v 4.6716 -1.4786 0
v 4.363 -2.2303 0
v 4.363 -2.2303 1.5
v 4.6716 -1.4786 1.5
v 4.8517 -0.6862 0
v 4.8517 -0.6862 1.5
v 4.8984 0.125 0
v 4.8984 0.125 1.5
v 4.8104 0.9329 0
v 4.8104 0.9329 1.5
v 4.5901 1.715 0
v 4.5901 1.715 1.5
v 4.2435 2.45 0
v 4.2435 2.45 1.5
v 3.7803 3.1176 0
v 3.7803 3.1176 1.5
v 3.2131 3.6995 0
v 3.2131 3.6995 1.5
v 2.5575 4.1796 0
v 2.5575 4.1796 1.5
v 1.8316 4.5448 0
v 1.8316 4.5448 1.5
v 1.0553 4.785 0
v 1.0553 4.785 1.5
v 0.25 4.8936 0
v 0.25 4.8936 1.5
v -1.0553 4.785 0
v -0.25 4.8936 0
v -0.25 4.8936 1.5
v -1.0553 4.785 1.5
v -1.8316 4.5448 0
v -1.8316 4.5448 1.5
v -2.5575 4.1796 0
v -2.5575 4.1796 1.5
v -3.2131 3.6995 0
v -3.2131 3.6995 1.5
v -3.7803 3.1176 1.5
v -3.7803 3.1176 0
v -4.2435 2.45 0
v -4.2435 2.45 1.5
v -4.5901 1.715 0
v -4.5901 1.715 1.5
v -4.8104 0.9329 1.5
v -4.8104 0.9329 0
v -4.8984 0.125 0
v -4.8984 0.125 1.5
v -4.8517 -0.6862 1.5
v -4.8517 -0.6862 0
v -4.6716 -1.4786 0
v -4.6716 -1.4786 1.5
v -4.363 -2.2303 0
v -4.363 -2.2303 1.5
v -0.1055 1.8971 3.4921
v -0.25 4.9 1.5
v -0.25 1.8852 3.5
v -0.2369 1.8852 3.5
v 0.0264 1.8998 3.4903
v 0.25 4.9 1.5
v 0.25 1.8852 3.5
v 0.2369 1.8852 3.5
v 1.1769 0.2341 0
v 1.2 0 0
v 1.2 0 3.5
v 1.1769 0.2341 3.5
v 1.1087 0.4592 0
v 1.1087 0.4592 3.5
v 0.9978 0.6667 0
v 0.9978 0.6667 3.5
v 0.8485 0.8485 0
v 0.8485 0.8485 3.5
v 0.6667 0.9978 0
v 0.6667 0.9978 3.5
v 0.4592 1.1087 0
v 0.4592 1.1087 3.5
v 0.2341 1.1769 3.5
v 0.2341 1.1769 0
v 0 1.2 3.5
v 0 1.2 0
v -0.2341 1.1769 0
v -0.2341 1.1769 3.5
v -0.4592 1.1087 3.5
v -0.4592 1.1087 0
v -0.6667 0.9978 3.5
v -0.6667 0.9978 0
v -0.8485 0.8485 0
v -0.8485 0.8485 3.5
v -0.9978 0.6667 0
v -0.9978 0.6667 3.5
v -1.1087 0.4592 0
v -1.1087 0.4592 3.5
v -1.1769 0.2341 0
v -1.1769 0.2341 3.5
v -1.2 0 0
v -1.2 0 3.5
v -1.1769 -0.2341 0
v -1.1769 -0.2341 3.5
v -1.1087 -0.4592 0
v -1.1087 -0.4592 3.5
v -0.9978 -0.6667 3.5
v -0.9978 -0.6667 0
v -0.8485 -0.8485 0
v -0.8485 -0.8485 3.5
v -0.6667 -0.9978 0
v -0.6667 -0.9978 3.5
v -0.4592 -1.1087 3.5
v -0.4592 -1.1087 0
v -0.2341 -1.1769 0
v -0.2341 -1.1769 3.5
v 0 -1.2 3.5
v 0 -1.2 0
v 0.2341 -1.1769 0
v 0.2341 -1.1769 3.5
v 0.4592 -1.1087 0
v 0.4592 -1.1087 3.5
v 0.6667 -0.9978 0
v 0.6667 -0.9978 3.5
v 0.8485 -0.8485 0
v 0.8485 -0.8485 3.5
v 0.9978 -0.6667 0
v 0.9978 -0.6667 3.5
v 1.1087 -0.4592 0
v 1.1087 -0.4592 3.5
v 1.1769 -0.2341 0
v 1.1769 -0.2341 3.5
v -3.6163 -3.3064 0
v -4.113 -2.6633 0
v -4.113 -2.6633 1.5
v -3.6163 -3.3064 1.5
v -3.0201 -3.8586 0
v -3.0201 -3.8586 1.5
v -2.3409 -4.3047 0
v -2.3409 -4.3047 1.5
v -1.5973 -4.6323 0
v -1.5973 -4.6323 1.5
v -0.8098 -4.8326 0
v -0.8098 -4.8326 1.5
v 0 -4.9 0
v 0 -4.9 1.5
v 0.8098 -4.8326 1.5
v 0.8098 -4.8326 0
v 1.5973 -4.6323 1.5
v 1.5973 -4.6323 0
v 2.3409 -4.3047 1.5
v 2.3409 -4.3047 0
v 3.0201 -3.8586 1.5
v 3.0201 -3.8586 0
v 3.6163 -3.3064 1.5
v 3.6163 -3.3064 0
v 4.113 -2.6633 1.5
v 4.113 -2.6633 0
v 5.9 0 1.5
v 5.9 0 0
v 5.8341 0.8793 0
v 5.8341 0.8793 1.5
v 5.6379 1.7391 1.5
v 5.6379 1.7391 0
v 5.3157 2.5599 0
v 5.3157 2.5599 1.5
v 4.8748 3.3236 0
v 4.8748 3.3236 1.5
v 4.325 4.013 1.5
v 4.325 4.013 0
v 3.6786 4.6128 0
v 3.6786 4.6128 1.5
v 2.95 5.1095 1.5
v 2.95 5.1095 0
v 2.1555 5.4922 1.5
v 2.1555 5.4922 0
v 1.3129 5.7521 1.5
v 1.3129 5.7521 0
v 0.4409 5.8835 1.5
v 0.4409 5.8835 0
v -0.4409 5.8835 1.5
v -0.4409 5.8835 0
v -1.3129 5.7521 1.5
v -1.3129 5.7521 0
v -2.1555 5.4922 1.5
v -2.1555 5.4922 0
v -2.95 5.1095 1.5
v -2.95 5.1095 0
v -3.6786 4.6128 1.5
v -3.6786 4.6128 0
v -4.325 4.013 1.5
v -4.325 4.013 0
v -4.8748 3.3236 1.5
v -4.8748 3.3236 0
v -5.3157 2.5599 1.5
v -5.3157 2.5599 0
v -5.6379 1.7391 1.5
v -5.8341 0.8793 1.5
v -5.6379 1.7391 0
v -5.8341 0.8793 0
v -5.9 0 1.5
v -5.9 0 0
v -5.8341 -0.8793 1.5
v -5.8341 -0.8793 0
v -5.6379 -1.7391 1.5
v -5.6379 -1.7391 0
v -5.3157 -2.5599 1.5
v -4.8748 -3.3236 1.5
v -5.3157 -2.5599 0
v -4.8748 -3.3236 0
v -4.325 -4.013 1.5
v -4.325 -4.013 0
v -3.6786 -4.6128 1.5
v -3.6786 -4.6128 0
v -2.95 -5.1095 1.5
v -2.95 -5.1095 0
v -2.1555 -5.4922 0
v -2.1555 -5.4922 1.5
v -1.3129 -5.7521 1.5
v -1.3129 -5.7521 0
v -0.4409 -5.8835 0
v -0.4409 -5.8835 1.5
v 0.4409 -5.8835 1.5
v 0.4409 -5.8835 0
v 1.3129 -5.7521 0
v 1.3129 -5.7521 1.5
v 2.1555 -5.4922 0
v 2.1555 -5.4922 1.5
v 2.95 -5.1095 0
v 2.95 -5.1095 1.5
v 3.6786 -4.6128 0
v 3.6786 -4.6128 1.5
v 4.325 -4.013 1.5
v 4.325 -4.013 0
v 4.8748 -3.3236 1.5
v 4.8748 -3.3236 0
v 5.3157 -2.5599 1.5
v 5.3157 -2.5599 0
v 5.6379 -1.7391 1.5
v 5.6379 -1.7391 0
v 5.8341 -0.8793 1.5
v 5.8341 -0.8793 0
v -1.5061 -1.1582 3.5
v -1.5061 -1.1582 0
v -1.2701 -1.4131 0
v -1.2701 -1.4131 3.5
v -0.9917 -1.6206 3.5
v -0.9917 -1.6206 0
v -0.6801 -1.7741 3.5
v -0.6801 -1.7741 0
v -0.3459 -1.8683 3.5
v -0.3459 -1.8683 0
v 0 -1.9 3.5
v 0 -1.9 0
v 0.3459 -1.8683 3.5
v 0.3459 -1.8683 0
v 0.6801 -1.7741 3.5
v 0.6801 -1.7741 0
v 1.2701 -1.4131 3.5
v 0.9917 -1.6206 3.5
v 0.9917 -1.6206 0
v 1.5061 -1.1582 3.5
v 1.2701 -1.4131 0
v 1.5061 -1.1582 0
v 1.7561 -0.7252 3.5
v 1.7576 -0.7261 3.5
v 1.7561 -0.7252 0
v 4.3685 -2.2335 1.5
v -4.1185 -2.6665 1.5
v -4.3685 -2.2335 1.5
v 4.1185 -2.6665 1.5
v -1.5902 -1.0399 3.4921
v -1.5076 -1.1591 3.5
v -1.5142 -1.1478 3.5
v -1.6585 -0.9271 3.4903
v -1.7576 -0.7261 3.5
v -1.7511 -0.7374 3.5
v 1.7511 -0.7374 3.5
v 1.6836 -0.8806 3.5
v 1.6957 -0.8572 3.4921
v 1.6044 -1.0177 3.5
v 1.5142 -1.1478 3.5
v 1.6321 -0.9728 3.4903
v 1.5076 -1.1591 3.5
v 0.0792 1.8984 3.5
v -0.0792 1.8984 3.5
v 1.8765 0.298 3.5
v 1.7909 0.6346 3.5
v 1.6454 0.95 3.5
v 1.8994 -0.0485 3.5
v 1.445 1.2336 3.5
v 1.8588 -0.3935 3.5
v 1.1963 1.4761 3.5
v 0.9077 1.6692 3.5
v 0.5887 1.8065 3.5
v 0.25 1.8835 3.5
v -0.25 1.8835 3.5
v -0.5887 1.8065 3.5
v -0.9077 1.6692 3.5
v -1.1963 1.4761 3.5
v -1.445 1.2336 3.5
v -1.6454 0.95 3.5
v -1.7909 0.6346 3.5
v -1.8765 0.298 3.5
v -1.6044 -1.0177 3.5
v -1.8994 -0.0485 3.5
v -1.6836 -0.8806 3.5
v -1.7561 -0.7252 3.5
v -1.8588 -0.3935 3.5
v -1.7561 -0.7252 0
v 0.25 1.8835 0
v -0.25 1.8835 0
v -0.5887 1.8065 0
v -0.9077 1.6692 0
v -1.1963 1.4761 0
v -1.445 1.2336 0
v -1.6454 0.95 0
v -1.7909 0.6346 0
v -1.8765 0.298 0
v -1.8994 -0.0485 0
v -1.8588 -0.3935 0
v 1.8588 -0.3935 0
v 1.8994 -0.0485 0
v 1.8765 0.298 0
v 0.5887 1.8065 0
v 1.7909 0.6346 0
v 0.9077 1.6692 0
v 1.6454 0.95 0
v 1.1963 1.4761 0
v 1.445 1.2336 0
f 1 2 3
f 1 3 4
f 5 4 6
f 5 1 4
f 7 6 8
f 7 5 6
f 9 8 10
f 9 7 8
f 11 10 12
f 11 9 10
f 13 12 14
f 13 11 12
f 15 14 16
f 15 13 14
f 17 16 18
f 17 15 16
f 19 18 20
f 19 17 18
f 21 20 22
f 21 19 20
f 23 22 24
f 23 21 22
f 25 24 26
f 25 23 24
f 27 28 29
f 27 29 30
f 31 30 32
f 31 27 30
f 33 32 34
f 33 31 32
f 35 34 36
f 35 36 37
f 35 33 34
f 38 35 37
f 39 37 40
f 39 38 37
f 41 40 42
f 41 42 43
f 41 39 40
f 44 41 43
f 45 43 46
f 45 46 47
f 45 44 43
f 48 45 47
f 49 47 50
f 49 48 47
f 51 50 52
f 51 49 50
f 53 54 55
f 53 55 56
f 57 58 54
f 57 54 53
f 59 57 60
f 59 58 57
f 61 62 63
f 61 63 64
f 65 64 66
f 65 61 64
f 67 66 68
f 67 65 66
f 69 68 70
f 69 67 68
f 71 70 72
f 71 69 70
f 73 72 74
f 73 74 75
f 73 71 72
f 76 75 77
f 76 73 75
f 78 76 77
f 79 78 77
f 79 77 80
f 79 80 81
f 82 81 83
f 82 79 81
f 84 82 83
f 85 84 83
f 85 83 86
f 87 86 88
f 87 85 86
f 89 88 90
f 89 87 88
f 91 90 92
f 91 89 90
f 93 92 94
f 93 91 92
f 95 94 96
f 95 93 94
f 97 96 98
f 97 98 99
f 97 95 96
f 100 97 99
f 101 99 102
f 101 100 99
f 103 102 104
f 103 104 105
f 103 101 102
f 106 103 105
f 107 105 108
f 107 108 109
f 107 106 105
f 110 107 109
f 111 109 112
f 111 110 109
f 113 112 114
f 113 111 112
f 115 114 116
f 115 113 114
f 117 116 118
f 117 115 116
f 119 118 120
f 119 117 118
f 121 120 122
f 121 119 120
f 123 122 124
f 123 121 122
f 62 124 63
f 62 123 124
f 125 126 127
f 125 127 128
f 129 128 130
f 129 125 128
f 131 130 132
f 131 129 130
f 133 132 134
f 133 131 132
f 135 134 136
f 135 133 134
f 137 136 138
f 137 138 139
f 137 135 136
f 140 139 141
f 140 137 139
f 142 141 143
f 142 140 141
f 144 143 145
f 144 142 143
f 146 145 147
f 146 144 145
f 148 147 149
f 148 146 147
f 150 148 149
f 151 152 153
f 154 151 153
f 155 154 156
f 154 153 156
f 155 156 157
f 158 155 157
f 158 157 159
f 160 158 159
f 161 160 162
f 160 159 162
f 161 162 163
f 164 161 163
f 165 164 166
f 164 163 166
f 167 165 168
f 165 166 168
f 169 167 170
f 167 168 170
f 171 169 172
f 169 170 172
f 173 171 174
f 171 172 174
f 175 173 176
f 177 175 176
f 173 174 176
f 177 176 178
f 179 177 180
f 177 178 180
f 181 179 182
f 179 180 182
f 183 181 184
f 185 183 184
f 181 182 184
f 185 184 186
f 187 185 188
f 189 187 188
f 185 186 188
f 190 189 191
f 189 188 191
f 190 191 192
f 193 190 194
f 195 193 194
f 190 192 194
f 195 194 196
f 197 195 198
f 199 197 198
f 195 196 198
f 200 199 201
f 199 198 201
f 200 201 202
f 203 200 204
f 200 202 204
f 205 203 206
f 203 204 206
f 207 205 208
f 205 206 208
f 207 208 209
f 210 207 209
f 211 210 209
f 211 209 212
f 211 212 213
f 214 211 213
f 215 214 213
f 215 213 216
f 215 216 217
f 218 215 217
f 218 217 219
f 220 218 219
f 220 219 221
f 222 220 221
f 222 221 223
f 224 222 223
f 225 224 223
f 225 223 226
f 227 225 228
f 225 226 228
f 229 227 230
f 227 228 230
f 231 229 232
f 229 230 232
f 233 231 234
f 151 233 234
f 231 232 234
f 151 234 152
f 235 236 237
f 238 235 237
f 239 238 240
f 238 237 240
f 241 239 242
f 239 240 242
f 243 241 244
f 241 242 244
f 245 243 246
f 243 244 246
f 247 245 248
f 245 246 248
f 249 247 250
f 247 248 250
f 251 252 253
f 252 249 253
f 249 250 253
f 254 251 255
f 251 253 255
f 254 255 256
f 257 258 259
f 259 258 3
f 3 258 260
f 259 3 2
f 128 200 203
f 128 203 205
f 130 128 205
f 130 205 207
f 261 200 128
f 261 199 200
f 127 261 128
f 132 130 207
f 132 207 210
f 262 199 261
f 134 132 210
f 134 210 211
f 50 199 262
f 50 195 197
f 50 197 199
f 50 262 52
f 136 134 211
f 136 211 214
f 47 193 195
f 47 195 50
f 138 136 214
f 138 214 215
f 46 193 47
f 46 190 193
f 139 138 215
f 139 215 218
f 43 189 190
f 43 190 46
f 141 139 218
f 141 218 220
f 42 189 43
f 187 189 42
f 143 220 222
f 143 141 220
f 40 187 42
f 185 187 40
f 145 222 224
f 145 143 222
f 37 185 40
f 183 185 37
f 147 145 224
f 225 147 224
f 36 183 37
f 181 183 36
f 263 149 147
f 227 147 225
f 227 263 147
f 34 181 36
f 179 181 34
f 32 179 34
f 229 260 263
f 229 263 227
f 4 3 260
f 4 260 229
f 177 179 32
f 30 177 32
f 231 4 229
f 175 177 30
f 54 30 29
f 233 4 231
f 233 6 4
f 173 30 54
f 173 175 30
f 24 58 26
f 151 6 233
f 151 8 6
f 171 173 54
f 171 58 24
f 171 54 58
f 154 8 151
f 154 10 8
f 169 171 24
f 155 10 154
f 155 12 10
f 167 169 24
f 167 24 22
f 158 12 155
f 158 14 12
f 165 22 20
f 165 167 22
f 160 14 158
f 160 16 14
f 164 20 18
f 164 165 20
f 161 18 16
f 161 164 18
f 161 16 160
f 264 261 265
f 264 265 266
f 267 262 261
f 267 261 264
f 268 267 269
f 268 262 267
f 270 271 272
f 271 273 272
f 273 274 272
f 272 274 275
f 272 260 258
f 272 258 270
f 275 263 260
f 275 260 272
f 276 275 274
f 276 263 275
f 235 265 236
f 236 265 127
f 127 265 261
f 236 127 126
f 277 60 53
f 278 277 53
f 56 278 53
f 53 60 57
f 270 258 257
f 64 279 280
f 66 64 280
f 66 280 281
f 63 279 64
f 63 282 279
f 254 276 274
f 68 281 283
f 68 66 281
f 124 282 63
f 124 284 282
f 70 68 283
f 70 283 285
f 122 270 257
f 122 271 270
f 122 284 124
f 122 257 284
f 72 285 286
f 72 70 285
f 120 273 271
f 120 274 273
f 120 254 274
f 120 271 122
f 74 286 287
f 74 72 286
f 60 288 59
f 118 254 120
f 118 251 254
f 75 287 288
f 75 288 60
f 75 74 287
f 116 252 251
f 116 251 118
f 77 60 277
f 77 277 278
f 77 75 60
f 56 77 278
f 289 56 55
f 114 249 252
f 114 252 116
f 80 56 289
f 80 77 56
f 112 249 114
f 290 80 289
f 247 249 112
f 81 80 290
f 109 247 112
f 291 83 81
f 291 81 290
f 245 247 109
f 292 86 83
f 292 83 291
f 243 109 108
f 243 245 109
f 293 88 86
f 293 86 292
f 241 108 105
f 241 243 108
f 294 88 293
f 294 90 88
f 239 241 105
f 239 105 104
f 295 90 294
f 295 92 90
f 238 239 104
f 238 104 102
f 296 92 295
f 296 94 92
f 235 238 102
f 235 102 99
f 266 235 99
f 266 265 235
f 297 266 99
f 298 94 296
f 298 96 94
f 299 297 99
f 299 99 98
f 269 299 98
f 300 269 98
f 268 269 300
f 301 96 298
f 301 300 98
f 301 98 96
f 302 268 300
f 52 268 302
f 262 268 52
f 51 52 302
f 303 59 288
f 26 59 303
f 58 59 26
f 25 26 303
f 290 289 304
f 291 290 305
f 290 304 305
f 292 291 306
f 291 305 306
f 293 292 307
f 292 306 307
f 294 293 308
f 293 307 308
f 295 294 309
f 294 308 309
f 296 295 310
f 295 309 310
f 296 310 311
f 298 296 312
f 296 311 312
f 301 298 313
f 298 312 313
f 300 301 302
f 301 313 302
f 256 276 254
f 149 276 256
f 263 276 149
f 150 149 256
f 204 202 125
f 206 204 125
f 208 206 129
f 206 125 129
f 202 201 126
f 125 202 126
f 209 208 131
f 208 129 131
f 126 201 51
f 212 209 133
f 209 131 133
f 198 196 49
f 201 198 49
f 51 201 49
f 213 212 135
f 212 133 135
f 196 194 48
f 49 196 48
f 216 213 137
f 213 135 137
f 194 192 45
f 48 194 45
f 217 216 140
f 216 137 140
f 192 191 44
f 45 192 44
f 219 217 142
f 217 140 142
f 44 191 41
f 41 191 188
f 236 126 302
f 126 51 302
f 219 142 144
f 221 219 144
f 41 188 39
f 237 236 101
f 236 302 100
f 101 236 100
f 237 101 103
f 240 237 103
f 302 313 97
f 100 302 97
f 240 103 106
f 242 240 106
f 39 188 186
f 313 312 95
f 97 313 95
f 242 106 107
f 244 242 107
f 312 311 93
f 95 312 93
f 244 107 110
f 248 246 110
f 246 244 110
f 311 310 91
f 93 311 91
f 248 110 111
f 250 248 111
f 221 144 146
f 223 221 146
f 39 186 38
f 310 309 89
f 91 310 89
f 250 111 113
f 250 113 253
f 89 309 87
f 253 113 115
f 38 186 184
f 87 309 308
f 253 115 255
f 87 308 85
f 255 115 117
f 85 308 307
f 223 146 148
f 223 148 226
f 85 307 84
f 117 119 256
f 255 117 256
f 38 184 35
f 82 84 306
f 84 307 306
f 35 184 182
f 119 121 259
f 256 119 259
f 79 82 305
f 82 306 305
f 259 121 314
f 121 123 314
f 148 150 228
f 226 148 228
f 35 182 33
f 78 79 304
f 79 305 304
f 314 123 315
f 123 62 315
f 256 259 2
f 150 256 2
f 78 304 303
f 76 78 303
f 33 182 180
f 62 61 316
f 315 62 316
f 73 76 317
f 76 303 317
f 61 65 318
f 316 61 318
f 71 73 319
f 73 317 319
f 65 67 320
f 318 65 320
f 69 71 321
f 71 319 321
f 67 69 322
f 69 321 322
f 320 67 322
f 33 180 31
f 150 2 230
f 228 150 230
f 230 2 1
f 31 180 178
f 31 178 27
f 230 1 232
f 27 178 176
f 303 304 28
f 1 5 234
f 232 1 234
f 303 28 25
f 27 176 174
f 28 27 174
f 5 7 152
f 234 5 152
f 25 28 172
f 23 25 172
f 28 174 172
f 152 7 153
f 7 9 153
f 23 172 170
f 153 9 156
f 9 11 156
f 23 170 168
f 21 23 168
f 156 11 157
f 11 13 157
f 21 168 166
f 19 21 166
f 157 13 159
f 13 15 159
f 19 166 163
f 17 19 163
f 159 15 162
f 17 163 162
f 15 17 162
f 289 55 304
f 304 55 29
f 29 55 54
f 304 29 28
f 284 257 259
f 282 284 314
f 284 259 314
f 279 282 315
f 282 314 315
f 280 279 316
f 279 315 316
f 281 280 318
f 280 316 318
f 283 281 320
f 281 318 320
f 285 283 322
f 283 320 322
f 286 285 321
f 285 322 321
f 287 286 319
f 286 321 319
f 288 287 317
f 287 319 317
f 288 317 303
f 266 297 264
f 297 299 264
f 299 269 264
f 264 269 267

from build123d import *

# Parameters (mm, degrees)
SKETCH1_R           = 1.9
SKETCH1_R_2         = 1.2
BOSS_EXTRUDE1_DEPTH = 3.5
SKETCH2_R           = 5.9
SKETCH2_R_2         = 4.9
BOSS_EXTRUDE2_DEPTH = 1.5
BOSS_EXTRUDE3_DEPTH = 0.25
CIRPATTERN1_COUNT   = 3


with BuildPart() as part:
    # Sketch1 → Boss-Extrude1 (new body)
    with BuildSketch(Plane.XY):
        Circle(SKETCH1_R)
        Circle(SKETCH1_R_2, mode=Mode.SUBTRACT)
    extrude(amount=BOSS_EXTRUDE1_DEPTH)



with BuildPart() as body_2:
    # Sketch2 → Boss-Extrude2 (new body)
    with BuildSketch(Plane.XY):
        Circle(SKETCH2_R)
        Circle(SKETCH2_R_2, mode=Mode.SUBTRACT)
    extrude(amount=BOSS_EXTRUDE2_DEPTH)


with BuildPart() as part_1:
    add(part.part)

    add(body_2.part)  # Boss-Extrude3 merges body 2
    # Sketch3 → Boss-Extrude3 (add, symmetric)
    with BuildSketch(Plane(origin=(0, 0, 0), x_dir=(0, 0, -1), z_dir=(1, 0, 0))):
        Polygon((0, 4.9), (-1.5, 4.9), (-3.5, 1.885172848), (-3.5, 1.643172848), (0, 1.643172848), align=None)
    boss_extrude3 = extrude(amount=BOSS_EXTRUDE3_DEPTH, both=True)

    # CirPattern1: Boss-Extrude3 ×3 about axis
    cirpattern1_axis = Axis((0, 0, 3.5), (0, 0, -1))
    for i in range(1, CIRPATTERN1_COUNT):
        add(boss_extrude3.rotate(cirpattern1_axis, i * 360 / CIRPATTERN1_COUNT))


solid = part_1.part
